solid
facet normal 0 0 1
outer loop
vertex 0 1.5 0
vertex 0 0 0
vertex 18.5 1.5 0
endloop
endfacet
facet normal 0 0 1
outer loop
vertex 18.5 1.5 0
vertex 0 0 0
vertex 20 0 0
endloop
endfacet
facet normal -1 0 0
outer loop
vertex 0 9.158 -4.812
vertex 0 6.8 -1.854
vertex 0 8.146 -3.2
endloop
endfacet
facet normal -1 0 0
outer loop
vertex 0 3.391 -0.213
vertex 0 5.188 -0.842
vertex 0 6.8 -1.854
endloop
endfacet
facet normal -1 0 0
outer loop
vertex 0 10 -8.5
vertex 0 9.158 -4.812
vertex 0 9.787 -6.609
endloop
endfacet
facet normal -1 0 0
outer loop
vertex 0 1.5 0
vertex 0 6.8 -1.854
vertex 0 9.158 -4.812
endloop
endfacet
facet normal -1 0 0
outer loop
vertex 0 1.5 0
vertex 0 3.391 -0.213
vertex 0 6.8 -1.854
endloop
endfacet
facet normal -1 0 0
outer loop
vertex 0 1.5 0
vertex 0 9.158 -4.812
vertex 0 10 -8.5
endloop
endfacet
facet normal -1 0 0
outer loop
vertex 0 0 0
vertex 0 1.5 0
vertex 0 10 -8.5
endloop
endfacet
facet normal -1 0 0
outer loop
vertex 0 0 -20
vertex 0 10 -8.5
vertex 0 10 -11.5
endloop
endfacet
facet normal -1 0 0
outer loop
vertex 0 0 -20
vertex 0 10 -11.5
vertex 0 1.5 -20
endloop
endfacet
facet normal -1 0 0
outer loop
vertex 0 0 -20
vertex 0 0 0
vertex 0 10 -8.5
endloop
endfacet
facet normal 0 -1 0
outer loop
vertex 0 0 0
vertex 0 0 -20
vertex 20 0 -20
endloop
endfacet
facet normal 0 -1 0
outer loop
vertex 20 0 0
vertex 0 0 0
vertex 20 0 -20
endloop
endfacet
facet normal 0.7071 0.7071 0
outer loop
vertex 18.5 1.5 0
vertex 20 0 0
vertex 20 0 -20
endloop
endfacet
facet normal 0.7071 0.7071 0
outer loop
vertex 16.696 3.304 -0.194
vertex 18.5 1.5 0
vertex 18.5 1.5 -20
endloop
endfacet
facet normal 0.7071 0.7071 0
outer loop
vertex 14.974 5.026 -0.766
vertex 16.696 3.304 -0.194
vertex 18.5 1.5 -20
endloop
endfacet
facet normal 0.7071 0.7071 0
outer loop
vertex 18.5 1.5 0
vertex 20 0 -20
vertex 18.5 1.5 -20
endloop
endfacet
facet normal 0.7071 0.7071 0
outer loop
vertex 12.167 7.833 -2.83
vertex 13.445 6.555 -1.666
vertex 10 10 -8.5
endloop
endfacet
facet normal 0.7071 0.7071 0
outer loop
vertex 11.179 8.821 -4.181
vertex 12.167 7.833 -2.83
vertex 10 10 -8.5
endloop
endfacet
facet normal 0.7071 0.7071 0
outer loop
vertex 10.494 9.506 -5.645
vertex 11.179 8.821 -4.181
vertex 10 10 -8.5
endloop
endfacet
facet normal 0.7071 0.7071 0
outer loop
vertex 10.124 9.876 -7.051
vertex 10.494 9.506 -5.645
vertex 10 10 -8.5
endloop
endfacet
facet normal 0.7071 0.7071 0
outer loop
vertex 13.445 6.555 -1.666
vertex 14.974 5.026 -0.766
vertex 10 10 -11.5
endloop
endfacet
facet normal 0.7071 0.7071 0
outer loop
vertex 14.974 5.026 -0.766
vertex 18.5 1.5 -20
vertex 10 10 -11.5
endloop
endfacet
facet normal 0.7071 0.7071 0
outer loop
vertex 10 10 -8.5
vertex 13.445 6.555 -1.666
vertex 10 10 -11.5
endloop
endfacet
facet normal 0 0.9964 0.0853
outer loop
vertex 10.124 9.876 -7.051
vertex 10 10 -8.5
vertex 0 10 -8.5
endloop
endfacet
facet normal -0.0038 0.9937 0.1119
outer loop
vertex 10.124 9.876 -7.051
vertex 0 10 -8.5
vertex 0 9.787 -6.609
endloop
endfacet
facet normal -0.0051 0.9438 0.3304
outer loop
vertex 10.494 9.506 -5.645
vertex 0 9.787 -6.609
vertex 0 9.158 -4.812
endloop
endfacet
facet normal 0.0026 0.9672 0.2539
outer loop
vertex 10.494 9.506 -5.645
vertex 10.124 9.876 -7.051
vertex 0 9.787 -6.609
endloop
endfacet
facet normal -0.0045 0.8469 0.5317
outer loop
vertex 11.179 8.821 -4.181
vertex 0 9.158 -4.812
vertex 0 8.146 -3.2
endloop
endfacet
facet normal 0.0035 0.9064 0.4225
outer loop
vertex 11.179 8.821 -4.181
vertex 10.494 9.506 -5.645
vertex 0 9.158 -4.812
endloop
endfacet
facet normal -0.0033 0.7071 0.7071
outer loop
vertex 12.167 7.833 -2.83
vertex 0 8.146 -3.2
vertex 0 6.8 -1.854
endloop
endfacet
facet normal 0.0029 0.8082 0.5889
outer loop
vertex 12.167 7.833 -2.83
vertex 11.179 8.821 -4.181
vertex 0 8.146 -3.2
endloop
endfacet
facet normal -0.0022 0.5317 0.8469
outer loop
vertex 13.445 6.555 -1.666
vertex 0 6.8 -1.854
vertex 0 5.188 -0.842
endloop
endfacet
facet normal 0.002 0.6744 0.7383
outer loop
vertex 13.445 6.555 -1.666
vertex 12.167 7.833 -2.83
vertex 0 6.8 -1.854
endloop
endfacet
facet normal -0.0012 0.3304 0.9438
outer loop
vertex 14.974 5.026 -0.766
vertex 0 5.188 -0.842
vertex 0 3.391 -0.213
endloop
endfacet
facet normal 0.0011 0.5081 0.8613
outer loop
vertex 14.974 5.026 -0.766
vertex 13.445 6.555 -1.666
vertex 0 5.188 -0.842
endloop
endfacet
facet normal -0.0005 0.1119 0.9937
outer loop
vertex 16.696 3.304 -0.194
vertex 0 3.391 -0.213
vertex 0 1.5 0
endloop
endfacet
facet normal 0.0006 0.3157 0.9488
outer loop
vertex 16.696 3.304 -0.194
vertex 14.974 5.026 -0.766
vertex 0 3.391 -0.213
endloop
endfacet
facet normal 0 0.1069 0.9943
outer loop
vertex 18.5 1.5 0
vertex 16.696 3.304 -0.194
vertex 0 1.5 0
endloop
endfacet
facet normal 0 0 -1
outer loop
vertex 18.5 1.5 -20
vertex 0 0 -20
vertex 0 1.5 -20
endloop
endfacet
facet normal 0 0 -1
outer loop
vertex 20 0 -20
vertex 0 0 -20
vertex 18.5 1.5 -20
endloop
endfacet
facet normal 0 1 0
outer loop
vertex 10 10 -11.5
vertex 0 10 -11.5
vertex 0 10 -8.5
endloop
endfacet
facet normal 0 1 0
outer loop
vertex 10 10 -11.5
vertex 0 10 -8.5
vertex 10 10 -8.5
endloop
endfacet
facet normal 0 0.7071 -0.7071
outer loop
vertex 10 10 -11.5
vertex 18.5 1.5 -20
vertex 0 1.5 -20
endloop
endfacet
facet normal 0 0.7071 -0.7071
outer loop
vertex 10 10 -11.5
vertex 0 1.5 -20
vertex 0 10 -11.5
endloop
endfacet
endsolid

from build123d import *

# Parameters (mm, degrees)
SKETCH1_W           = 20
SKETCH1_H           = 20
BOSS_EXTRUDE1_DEPTH = 10
CUT_EXTRUDE1_DEPTH  = 21
CUT_EXTRUDE2_DEPTH  = 21


with BuildPart() as part:
    # Sketch1 → Boss-Extrude1 (new body)
    with BuildSketch(Plane(origin=(0, 0, 0), x_dir=(1, 0, 0), z_dir=(0, 1, 0))):
        with Locations((10, 10)):
            Rectangle(SKETCH1_W, SKETCH1_H)
    extrude(amount=BOSS_EXTRUDE1_DEPTH)

    # Sketch2 → Cut-Extrude1 (cut, through all)
    with BuildSketch(Plane(origin=(20, 0, 0), x_dir=(0, 0, -1), z_dir=(1, 0, 0))):
        Polygon((20, 1.5), (11.5, 10), (20, 10), align=None)
        with BuildLine():
            Line((0, 1.5), (0, 10))
            Line((0, 10), (8.5, 10))
            ThreePointArc((8.5, 10), (2.48959236, 7.51040764), (0, 1.5))
        make_face()
    extrude(amount=-CUT_EXTRUDE1_DEPTH, mode=Mode.SUBTRACT)

    # Sketch3 → Cut-Extrude2 (cut, through all)
    with BuildSketch(Plane(origin=(0, 0, -20), x_dir=(-1, 0, 0), z_dir=(0, 0, -1))):
        Polygon((-20, 0), (-10, 10), (-20, 10), align=None)
    extrude(amount=-CUT_EXTRUDE2_DEPTH, mode=Mode.SUBTRACT)


solid = part.part
